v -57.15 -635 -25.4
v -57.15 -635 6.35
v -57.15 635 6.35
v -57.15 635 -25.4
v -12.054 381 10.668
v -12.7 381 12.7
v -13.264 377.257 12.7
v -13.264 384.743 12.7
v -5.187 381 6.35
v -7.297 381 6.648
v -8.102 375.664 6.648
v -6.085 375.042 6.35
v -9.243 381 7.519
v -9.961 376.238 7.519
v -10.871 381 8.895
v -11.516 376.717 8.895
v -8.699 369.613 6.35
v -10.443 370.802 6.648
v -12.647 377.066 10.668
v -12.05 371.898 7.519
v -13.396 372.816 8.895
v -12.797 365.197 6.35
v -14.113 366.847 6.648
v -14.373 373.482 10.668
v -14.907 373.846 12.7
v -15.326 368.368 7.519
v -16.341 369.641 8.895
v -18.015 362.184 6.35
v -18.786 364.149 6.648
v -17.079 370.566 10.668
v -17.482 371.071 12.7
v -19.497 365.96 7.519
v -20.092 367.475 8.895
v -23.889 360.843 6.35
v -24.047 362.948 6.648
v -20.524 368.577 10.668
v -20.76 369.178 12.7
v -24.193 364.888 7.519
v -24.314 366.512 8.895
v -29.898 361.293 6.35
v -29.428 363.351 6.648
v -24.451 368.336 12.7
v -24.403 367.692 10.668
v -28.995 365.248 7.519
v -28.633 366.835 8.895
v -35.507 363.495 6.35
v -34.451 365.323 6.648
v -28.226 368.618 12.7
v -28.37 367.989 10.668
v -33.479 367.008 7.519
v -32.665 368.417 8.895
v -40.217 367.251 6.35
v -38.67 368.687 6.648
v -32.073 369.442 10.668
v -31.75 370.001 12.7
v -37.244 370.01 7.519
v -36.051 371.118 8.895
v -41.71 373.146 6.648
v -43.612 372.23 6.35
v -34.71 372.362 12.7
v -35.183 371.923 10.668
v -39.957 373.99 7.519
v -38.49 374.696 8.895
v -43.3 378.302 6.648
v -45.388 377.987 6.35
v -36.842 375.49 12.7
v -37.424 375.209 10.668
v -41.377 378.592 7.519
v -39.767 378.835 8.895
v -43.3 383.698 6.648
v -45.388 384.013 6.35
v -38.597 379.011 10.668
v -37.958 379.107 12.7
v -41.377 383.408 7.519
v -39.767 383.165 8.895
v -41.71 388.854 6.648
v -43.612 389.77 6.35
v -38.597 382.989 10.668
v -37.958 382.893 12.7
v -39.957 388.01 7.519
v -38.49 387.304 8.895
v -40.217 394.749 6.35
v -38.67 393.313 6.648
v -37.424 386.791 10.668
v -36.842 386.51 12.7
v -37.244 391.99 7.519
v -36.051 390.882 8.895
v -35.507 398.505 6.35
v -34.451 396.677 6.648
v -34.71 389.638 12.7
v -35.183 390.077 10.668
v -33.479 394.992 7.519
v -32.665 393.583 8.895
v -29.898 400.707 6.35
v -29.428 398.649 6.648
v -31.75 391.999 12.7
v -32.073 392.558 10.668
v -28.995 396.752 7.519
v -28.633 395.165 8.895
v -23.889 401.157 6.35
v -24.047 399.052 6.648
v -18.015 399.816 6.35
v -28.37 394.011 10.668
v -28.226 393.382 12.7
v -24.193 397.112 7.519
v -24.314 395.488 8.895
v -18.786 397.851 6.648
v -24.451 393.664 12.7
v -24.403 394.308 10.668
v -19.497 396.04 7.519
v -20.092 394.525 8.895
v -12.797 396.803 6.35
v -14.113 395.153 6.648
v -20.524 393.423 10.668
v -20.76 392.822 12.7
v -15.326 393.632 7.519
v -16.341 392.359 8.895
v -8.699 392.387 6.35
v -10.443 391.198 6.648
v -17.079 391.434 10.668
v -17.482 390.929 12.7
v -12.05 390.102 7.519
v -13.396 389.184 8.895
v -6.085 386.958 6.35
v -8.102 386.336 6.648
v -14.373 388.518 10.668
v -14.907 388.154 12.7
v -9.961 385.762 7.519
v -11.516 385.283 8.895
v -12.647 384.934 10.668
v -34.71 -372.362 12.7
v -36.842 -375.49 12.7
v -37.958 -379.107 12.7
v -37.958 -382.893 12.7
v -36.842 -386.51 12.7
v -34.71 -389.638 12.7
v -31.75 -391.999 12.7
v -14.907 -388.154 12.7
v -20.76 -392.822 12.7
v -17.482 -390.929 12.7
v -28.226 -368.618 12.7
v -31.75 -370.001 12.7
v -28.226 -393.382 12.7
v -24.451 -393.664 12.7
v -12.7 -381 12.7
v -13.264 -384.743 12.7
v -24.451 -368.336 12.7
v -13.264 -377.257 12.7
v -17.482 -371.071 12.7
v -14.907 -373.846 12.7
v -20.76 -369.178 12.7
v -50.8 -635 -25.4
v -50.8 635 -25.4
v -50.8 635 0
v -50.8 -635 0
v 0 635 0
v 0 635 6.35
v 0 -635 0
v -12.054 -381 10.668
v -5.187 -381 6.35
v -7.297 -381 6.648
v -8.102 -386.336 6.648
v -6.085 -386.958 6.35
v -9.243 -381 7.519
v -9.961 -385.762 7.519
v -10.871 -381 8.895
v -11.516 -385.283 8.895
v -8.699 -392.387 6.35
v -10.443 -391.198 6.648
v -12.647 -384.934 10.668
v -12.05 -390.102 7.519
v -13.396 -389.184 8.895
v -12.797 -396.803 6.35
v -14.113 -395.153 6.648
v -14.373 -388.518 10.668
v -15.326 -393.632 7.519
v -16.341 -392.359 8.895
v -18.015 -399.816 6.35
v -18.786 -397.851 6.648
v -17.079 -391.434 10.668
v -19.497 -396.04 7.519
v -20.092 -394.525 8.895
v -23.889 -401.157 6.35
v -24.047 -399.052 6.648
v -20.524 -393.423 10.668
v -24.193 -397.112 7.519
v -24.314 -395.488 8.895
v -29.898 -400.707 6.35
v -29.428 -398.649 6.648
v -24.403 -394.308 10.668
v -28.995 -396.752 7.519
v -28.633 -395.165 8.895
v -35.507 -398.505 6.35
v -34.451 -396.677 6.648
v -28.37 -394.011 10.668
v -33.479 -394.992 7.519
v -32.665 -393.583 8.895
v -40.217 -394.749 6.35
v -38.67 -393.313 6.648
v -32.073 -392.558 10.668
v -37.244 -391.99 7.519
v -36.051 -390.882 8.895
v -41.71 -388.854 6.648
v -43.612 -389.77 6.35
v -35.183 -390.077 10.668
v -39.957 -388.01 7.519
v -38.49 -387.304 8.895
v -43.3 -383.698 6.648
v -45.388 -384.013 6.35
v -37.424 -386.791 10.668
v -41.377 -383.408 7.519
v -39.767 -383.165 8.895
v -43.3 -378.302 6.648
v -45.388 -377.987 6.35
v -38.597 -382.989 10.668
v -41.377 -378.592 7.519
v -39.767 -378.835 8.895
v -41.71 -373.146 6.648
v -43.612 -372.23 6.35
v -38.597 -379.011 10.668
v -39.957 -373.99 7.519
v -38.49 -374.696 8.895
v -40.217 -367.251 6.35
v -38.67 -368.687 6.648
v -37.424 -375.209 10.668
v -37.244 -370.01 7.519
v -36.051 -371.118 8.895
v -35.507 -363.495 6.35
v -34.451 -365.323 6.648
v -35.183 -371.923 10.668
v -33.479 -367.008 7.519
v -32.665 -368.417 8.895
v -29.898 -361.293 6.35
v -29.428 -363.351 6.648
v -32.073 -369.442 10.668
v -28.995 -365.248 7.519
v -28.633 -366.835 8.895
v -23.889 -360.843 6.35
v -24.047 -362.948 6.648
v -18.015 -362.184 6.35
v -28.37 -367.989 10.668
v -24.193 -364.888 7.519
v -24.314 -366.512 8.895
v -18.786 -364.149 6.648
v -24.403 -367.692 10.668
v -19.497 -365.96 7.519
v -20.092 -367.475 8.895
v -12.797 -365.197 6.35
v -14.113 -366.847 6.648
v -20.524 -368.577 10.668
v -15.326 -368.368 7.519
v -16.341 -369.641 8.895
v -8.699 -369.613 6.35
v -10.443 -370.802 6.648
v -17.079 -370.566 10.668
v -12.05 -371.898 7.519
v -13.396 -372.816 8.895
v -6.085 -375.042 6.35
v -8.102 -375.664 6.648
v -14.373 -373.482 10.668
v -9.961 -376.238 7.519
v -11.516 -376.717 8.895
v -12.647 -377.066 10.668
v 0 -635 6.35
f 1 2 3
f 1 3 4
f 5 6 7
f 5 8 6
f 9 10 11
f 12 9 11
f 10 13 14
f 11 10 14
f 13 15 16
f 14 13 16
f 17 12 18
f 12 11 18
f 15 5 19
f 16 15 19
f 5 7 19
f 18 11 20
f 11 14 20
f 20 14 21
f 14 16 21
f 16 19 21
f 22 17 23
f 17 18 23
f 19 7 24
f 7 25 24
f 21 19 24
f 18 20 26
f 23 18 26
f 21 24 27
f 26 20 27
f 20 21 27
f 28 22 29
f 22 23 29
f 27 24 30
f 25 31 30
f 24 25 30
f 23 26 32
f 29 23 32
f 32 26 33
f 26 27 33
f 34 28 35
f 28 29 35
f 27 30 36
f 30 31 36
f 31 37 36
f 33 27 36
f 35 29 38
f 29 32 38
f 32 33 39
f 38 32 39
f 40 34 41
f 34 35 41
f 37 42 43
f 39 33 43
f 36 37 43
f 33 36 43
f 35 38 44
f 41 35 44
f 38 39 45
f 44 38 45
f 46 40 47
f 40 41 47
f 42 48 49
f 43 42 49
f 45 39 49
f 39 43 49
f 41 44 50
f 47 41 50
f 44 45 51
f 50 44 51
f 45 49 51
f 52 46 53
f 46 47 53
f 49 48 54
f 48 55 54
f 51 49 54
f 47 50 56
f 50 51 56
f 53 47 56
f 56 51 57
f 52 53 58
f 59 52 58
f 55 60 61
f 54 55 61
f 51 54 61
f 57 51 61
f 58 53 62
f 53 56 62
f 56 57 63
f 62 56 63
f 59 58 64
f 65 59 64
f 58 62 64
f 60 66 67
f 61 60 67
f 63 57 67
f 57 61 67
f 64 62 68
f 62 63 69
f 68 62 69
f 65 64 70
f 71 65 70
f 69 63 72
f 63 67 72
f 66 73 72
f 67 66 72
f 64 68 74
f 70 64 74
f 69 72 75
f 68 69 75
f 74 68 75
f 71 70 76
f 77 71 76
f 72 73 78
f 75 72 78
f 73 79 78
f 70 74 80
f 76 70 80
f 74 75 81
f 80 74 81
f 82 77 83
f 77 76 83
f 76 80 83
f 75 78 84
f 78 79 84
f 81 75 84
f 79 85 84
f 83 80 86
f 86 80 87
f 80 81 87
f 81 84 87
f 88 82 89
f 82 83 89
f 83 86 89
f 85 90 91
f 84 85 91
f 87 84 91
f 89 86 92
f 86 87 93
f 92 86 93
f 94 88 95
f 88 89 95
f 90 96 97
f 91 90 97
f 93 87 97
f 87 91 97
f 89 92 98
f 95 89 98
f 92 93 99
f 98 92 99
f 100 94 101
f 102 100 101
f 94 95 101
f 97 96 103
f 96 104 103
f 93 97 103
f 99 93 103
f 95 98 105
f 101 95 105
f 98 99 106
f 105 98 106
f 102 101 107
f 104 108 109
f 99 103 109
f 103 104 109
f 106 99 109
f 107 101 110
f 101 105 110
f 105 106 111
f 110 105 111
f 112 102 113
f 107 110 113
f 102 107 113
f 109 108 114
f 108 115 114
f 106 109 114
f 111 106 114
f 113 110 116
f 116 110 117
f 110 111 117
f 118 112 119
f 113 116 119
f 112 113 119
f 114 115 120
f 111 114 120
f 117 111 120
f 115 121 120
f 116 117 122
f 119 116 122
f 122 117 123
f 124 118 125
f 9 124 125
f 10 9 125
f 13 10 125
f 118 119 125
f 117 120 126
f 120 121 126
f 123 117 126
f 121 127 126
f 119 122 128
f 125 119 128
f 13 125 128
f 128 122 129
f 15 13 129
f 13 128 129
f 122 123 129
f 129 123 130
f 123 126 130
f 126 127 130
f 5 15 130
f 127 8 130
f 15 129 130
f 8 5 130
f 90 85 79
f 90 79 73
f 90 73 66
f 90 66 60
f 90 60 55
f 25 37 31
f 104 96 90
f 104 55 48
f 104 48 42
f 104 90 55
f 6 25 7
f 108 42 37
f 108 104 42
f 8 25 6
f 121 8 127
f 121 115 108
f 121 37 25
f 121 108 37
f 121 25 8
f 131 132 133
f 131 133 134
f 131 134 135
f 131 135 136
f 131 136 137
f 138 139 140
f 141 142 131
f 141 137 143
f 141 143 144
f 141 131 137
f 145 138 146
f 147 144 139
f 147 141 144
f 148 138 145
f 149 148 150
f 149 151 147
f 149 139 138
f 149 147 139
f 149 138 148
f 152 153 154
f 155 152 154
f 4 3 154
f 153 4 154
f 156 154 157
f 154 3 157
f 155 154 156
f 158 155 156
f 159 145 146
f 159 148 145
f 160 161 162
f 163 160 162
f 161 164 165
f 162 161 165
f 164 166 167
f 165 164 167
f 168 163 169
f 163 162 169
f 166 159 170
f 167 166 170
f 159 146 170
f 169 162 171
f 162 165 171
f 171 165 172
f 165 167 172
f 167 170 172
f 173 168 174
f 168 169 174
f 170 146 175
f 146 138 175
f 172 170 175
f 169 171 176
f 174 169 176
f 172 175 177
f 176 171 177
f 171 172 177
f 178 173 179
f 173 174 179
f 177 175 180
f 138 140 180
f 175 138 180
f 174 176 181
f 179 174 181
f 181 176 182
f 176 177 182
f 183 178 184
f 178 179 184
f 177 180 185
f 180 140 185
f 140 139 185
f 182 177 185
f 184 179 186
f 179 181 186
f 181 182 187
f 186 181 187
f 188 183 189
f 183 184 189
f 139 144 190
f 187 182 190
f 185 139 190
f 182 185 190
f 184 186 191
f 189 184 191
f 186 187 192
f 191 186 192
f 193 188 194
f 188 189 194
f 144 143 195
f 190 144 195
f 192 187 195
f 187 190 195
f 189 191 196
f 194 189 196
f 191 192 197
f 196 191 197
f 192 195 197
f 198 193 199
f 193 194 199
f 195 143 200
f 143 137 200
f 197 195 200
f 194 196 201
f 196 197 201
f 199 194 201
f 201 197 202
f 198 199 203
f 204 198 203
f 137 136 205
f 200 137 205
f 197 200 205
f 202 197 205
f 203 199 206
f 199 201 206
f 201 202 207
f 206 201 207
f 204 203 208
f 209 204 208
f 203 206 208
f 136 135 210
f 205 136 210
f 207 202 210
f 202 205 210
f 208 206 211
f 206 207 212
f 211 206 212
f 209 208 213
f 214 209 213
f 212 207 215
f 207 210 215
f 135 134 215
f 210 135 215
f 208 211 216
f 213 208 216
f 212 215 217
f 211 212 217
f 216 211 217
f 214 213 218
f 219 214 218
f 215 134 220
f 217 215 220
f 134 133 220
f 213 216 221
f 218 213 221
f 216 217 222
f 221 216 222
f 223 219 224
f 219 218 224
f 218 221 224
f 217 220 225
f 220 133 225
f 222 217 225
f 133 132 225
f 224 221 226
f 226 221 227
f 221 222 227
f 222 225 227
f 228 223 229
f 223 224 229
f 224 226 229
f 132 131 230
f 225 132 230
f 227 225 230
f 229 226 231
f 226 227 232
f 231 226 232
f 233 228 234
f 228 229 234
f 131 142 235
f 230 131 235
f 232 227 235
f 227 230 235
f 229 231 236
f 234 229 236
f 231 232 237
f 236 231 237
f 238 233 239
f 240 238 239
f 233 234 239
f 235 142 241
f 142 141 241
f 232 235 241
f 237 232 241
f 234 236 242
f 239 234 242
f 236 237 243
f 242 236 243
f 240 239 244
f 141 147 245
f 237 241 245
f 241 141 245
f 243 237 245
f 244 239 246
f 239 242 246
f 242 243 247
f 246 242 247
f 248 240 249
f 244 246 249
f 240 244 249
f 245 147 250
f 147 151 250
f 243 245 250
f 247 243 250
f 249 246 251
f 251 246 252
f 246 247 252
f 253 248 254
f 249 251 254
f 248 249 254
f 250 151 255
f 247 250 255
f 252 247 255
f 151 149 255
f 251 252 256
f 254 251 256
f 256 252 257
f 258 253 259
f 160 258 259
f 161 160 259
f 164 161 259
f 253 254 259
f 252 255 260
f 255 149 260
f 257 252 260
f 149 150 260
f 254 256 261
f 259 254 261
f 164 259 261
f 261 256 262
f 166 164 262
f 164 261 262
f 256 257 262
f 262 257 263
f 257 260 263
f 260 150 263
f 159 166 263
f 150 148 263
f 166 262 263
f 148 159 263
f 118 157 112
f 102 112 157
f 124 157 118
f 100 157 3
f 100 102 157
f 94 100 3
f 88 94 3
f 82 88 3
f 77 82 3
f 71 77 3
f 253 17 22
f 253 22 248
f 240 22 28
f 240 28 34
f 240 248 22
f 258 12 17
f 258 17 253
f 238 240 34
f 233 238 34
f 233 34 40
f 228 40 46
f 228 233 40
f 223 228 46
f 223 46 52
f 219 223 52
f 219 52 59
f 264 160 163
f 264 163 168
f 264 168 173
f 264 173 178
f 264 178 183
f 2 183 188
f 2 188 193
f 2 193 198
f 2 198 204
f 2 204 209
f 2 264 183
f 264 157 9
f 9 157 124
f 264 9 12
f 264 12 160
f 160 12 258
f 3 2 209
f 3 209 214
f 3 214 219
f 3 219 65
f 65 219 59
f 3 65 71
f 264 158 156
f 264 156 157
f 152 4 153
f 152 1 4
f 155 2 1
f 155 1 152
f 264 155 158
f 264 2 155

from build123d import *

# Parameters (mm, degrees)
F1_DEPTH = 635
F2_R     = 12.7
F3_DEPTH = 12.7


# Not quite as in the source:
# - a fillet or chamfer that OpenCascade refuses, or shapes differently, is made with other operations: its cross-section is extruded or revolved along the edge and cut away or added


with BuildPart() as f1:
    # F0 (on Front) → F1 (new body, symmetric)
    with BuildSketch(Plane.XZ):
        Polygon((-50.8, 0), (0, 0), (0, 6.35), (-57.15, 6.35), (-57.15, -25.4), (-50.8, -25.4), align=None)
    extrude(amount=F1_DEPTH, both=True)

    # F2 (on Top) → F3 (join)
    with BuildSketch(Plane.XY):
        with Locations((-25.4, 381)):
            Circle(F2_R)
        with Locations((-25.4, -381)):
            Circle(F2_R)
    extrude(amount=F3_DEPTH)

    # F4: fillet of radius 7.62 on 1 edges, made by hand

    # F4_s1 → F4_t2 (revolve)
    with BuildSketch(Plane.XZ.offset(-381)):
        with BuildLine():
            ThreePointArc((-5.1865786755, 6.35), (-10.1052675251, 8.1501288674), (-12.7, 12.7))
            Line((-12.7, 12.7), (-12.7, 6.35))
            Line((-12.7, 6.35), (-5.1865786755, 6.35))
        make_face()
    revolve(axis=Axis((-25.4, 381, 6.35), (0, 0, -1)))

    # F5: fillet of radius 7.62 on 1 edges, made by hand

    # F5_s1 → F5_t2 (revolve)
    with BuildSketch(Plane.XZ.offset(381)):
        with BuildLine():
            ThreePointArc((-5.1865786755, 6.35), (-10.1052675251, 8.1501288674), (-12.7, 12.7))
            Line((-12.7, 12.7), (-12.7, 6.35))
            Line((-12.7, 6.35), (-5.1865786755, 6.35))
        make_face()
    revolve(axis=Axis((-25.4, -381, 6.35), (0, 0, -1)))


solid = f1.part
